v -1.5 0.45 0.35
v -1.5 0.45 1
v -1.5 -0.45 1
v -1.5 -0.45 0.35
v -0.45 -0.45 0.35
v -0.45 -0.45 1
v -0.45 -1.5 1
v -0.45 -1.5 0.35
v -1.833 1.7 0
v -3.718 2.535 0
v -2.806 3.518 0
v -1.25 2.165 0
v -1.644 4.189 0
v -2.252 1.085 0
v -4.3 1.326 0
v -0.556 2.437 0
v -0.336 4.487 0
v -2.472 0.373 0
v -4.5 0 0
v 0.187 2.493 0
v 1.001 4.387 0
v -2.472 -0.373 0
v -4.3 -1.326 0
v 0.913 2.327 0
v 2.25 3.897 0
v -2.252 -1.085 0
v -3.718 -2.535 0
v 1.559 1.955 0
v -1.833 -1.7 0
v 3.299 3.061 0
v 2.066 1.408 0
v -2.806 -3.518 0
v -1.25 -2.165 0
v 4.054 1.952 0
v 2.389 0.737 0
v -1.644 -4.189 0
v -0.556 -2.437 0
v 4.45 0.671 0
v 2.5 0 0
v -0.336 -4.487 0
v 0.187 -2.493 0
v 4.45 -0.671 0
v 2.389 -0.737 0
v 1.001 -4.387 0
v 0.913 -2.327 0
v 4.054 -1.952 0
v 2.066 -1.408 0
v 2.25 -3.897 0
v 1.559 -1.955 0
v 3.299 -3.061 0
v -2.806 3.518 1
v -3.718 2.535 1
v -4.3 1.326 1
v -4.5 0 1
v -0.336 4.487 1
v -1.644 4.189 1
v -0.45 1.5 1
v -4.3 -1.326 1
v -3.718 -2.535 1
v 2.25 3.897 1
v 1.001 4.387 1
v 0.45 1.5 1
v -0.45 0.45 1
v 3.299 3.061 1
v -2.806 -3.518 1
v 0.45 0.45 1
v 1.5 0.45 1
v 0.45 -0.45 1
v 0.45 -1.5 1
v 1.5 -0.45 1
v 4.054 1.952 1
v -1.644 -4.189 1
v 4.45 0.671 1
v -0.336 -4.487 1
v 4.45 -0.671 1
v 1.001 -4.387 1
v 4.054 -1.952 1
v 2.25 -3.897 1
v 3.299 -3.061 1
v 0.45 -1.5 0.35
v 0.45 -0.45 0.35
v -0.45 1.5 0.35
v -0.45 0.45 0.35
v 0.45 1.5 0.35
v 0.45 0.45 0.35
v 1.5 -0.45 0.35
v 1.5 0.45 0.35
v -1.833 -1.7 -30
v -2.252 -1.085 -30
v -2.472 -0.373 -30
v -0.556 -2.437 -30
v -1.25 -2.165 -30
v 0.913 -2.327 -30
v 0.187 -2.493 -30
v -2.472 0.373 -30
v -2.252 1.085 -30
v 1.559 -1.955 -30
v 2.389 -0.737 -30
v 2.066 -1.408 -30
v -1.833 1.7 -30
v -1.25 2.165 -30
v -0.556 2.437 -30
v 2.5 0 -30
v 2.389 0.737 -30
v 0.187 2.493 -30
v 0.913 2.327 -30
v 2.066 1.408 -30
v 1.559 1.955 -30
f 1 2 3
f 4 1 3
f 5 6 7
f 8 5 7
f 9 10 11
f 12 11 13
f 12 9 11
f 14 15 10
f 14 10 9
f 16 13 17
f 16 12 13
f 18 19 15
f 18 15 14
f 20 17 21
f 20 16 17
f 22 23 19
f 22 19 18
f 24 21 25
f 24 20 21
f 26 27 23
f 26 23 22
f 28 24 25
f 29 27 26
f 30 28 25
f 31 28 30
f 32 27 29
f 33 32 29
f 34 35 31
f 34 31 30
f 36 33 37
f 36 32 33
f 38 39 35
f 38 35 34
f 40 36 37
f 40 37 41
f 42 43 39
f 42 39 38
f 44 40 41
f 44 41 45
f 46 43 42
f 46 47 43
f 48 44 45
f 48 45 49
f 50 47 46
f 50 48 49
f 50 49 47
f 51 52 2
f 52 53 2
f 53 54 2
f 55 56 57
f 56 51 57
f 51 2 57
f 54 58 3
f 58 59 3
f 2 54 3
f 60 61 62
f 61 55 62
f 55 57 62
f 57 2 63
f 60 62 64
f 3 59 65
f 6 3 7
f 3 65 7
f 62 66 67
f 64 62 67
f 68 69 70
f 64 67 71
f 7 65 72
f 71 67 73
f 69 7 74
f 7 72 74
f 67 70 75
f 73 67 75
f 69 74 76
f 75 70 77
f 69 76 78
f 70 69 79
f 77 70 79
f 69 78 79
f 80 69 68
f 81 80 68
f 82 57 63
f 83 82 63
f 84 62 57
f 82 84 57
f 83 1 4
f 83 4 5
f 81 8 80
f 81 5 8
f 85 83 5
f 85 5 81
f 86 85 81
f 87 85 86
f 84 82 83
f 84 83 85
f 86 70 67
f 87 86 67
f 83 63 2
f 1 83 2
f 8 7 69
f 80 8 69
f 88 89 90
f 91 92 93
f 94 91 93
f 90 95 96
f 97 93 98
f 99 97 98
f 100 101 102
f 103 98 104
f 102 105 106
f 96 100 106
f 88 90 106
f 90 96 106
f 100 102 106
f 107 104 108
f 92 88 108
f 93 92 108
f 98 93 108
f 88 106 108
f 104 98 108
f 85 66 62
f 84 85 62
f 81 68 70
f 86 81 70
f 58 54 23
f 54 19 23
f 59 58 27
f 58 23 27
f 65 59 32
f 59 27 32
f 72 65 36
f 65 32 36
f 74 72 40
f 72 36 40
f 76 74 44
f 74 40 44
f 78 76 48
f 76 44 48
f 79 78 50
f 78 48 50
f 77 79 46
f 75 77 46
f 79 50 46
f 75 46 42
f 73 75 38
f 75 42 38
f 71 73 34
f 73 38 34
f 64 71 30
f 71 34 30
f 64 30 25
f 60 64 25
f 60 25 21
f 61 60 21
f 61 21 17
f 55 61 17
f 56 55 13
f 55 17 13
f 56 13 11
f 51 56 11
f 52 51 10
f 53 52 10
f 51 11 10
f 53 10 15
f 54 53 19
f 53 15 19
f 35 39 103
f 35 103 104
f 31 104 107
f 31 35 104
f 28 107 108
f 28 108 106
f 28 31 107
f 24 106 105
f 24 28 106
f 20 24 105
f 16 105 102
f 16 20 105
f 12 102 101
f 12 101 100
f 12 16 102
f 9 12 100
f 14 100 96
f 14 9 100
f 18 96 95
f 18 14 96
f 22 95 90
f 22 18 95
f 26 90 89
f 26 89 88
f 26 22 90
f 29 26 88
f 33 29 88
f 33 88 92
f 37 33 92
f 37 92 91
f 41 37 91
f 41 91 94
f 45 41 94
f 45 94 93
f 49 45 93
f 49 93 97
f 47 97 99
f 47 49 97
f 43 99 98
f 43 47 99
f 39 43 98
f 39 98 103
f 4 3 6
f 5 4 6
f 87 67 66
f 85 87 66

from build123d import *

# Parameters (mm, degrees)
SKETCH_1_R        = 2.5
EXTRUDE_198_DEPTH = 30
SKETCH_6_W        = 4.5
SKETCH_6_H        = 1
PH2_START         = 1.01
PH2_DEPTH         = 0.66


with BuildPart() as part:
    # 草图1 → Extrude 198 (new body)
    with BuildSketch(Plane.XY):
        Circle(SKETCH_1_R)
    extrude(amount=-EXTRUDE_198_DEPTH)

    # 草图6 → Revolve 324 (revolve)
    with BuildSketch(Plane(origin=(0, 0, 0), x_dir=(1, 0, 0), z_dir=(0, 1, 0)), mode=Mode.PRIVATE) as revolve_324_sk:
        with Locations((2.25, -0.5)):
            Rectangle(SKETCH_6_W, SKETCH_6_H)
    revolve(revolve_324_sk.sketch.rotate(Axis((0, 0, -2), (0, 0, 1)), 180), axis=Axis((0, 0, -2), (0, 0, 1)))

    # 草图7 → 十字槽_PH2_简化 (cut)
    with BuildSketch(Plane.XY.offset(PH2_START)):
        Polygon((-0.45, -1.5), (0.45, -1.5), (0.45, -0.45), (1.5, -0.45), (1.5, 0.45), (0.45, 0.45), (0.45, 1.5), (-0.45, 1.5), (-0.45, 0.45), (-1.5, 0.45), (-1.5, -0.45), (-0.45, -0.45), align=None)
    extrude(amount=-PH2_DEPTH, mode=Mode.SUBTRACT)


solid = part.part
